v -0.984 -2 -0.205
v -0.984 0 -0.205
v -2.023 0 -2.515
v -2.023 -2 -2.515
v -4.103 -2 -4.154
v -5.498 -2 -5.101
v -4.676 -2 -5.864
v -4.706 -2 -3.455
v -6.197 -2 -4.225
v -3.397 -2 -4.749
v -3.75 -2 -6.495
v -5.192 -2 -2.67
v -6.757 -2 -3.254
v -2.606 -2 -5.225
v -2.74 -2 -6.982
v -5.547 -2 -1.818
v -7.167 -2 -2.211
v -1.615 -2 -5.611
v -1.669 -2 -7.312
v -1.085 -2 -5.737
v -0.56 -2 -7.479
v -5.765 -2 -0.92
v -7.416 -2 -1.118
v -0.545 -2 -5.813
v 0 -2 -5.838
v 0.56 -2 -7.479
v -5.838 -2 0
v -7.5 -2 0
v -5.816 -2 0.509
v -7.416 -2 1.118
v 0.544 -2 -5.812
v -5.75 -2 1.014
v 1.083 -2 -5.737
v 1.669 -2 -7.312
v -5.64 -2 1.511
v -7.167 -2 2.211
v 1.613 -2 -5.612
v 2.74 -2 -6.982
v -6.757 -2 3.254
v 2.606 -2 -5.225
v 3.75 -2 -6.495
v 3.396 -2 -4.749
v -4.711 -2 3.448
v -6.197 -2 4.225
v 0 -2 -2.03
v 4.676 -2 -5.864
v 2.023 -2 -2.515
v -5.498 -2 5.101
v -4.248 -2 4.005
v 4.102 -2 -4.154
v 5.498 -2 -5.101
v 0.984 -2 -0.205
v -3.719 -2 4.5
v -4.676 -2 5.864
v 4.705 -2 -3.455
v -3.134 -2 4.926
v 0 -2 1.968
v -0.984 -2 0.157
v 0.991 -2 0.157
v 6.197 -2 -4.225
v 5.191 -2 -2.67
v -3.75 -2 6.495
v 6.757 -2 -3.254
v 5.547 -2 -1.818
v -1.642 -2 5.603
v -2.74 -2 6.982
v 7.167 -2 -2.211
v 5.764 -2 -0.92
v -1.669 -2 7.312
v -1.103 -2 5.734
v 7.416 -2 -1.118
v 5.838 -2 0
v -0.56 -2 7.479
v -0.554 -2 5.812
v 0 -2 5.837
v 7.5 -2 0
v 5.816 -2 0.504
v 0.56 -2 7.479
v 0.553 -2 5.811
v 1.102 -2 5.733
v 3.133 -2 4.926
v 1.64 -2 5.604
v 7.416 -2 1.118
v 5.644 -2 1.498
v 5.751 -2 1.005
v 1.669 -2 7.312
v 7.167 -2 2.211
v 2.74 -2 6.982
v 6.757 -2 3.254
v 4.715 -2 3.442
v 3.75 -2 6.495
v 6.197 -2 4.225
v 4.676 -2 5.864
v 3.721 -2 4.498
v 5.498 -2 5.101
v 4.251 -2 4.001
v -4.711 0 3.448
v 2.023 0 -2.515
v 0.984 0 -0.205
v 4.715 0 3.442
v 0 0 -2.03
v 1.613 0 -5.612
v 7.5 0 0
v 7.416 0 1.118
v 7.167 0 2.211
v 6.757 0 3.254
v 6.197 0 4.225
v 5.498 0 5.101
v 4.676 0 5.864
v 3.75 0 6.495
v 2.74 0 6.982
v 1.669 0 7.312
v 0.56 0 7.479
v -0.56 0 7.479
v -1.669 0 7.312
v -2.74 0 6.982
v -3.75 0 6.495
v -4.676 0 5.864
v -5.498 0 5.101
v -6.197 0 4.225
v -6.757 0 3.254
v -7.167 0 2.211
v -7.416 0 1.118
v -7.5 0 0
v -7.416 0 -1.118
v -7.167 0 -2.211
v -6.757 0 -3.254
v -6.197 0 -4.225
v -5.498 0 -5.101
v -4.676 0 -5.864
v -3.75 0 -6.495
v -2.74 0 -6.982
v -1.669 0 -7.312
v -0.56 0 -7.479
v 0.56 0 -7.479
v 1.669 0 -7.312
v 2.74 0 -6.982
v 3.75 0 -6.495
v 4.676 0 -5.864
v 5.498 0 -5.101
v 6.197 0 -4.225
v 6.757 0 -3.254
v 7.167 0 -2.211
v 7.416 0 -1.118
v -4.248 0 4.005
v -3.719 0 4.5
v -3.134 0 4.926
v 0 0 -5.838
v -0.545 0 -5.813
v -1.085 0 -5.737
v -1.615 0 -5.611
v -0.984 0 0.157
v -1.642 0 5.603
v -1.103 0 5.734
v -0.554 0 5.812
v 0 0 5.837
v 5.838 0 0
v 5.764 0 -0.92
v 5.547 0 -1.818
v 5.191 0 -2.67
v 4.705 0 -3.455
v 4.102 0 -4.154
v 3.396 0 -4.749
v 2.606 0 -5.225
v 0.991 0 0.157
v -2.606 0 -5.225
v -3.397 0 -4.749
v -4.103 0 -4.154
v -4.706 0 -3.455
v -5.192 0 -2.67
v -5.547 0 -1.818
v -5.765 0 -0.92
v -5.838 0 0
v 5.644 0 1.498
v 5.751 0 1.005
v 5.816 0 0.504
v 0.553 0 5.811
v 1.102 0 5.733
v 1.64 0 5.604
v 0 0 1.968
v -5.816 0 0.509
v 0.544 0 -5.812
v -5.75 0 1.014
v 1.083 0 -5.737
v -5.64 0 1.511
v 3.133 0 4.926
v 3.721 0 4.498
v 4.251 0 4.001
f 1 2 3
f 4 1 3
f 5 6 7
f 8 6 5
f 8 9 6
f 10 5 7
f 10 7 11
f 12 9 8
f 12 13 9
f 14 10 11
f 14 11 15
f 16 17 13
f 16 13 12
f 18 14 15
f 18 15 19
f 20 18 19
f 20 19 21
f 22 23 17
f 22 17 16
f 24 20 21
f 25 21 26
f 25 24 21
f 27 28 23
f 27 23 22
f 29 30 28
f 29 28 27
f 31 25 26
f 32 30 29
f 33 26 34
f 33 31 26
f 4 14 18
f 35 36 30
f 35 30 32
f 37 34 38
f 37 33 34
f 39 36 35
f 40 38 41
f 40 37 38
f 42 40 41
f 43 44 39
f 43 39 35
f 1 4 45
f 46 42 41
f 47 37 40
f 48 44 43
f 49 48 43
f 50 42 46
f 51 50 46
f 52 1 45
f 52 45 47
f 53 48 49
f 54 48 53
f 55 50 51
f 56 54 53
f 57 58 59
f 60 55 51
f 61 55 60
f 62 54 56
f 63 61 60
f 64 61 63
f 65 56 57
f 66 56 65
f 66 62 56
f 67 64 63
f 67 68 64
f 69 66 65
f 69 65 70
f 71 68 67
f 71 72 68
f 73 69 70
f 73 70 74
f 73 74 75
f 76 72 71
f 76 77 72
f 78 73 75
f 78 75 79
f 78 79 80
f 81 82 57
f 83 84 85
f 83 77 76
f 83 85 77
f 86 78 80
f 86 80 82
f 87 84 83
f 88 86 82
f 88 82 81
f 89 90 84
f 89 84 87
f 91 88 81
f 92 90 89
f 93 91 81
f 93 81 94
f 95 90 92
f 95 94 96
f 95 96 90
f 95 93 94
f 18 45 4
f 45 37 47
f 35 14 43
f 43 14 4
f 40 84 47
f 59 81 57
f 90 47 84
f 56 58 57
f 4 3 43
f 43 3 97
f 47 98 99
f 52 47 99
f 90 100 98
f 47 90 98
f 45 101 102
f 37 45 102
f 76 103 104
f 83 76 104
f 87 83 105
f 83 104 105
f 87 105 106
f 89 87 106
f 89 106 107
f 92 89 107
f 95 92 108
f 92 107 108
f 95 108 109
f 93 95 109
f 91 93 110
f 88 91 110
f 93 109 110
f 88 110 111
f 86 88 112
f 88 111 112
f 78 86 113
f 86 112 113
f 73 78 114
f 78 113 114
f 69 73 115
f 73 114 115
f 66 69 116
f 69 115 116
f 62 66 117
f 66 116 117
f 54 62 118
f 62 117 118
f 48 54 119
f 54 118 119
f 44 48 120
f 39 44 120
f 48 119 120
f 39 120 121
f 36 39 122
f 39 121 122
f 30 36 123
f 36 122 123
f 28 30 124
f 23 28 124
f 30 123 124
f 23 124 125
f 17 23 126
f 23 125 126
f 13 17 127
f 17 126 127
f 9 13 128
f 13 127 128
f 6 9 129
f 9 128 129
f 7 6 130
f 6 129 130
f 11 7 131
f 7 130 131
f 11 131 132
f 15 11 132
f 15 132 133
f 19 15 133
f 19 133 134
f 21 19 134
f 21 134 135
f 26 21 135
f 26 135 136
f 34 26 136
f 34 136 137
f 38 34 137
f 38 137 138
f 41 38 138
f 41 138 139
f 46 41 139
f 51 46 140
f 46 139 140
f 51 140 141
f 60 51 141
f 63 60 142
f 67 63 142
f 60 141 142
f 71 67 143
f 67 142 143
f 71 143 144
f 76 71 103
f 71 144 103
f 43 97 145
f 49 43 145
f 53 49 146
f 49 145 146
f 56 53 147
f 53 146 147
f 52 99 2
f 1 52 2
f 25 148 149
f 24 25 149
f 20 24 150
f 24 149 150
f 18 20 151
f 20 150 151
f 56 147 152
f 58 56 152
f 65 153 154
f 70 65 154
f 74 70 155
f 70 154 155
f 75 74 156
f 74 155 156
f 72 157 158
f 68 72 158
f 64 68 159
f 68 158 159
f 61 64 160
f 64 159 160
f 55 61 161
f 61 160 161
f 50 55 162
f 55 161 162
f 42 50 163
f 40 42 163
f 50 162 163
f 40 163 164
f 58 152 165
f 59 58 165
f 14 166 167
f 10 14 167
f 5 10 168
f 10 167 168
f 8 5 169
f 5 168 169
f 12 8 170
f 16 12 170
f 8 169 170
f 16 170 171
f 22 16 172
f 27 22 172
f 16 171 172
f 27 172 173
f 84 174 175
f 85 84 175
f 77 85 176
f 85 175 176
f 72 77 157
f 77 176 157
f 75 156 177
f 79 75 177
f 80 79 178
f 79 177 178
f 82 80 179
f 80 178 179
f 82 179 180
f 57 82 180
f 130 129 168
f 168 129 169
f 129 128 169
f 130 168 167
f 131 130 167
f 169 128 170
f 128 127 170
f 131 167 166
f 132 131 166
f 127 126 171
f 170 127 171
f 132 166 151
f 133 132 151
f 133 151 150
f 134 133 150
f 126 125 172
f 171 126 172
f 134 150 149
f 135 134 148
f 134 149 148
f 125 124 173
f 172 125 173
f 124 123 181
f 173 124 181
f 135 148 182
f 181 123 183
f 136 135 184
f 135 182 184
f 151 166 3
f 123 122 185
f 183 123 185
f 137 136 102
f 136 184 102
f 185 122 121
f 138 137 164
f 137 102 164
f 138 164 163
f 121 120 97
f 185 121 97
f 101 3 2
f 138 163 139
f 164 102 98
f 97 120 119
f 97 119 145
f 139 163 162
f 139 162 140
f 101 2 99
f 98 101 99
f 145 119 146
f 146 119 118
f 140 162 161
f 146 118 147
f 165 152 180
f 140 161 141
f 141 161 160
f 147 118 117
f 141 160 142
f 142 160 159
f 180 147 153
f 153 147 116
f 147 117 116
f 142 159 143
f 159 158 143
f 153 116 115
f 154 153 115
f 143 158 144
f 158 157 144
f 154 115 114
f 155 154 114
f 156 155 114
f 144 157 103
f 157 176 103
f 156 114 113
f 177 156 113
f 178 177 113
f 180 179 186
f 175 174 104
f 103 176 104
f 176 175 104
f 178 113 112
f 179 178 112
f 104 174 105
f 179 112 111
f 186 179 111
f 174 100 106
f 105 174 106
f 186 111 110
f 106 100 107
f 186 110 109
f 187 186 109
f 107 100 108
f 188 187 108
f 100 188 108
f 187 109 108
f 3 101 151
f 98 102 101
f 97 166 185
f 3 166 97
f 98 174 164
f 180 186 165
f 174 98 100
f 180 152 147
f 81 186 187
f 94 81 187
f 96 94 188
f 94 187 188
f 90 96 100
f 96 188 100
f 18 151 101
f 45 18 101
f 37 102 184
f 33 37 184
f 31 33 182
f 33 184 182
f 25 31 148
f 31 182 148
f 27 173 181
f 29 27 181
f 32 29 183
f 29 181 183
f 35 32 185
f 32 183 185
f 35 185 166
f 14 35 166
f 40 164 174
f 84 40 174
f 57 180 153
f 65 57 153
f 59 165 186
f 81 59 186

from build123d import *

# Parameters (mm, degrees)
F1_DEPTH = 2


# Not quite as in the source:
# - ends of sketch curves that miss each other by under 0.0002 mm in the source are joined


with BuildPart() as f1:
    # F0 (on Front) → F1 (new body)
    with BuildSketch(Plane.XZ):
        with BuildLine():
            ThreePointArc((-7.5, 0), (0, -7.5), (7.5, 0))
            ThreePointArc((7.5, 0), (0, 7.5), (-7.5, 0))
        make_face()
        with BuildLine():
            ThreePointArc((-9.252e-06, -5.837642026), (-0.8154481123, -5.781304427), (-1.6149720231, -5.6113751006))
            Line((-1.6149720231, -5.6113751006), (0, -2.0297722424))
            Line((0, -2.0297722424), (1.6130763481, -5.6119564271))
            ThreePointArc((1.6130763481, -5.6119564271), (0.8143893667, -5.7809478456), (-9.252e-06, -5.837642026))
        make_face(mode=Mode.SUBTRACT)
        with BuildLine():
            ThreePointArc((-5.8376432623, 4.535e-07), (-5.7885795806, 0.7619262356), (-5.6402209677, 1.5108774116))
            Line((-5.6402209677, 1.5108774116), (-2.6057938378, -5.2253115461))
            ThreePointArc((-2.6057938378, -5.2253115461), (-4.9642649621, -3.0719201723), (-5.8376432623, 4.535e-07))
        make_face(mode=Mode.SUBTRACT)
        with BuildLine():
            ThreePointArc((5.8375074432, 8.164e-07), (4.9638082552, -3.0717207498), (2.6056583249, -5.2253113695))
            Line((2.6056583249, -5.2253113695), (5.6435948014, 1.498042557))
            ThreePointArc((5.6435948014, 1.498042557), (5.7887533107, 0.7552604254), (5.8375074432, 8.164e-07))
        make_face(mode=Mode.SUBTRACT)
        with BuildLine():
            Line((0, 1.9682461262), (-1.6421023797, 5.6034935248))
            ThreePointArc((-1.6421023797, 5.6034935248), (-0.8294183969, 5.7791792496), (-8.9799e-06, 5.8374974962))
            ThreePointArc((-8.9799e-06, 5.8374974962), (0.8283723862, 5.7788128003), (1.6402065238, 5.6039289974))
            Line((1.6402065238, 5.6039289974), (0, 1.9682461262))
        make_face(mode=Mode.SUBTRACT)
        with BuildLine():
            Line((0.990821727, 0.1571487487), (3.1334508081, 4.9261166556))
            ThreePointArc((3.1334508081, 4.9261166556), (3.9933572695, 4.2579147754), (4.7150061526, 3.4423429304))
            Line((4.7150061526, 3.4423429304), (2.0229239131, -2.5149786417))
            Line((2.0229239131, -2.5149786417), (0.9841275984, -0.2051414777))
            Line((0.9841275984, -0.2051414777), (-0.9841094572, -0.2051414777))
            Line((-0.9841094572, -0.2051414777), (-2.0228967012, -2.5149786417))
            Line((-2.0228967012, -2.5149786417), (-4.7110881859, 3.447911577))
            ThreePointArc((-4.7110881859, 3.447911577), (-3.9911114988, 4.2602728506), (-3.1337140349, 4.925981317))
            Line((-3.1337140349, 4.925981317), (-0.9841094572, 0.1571487487))
            Line((-0.9841094572, 0.1571487487), (0.990821727, 0.1571487487))
        make_face(mode=Mode.SUBTRACT)
    extrude(amount=F1_DEPTH)


solid = f1.part
